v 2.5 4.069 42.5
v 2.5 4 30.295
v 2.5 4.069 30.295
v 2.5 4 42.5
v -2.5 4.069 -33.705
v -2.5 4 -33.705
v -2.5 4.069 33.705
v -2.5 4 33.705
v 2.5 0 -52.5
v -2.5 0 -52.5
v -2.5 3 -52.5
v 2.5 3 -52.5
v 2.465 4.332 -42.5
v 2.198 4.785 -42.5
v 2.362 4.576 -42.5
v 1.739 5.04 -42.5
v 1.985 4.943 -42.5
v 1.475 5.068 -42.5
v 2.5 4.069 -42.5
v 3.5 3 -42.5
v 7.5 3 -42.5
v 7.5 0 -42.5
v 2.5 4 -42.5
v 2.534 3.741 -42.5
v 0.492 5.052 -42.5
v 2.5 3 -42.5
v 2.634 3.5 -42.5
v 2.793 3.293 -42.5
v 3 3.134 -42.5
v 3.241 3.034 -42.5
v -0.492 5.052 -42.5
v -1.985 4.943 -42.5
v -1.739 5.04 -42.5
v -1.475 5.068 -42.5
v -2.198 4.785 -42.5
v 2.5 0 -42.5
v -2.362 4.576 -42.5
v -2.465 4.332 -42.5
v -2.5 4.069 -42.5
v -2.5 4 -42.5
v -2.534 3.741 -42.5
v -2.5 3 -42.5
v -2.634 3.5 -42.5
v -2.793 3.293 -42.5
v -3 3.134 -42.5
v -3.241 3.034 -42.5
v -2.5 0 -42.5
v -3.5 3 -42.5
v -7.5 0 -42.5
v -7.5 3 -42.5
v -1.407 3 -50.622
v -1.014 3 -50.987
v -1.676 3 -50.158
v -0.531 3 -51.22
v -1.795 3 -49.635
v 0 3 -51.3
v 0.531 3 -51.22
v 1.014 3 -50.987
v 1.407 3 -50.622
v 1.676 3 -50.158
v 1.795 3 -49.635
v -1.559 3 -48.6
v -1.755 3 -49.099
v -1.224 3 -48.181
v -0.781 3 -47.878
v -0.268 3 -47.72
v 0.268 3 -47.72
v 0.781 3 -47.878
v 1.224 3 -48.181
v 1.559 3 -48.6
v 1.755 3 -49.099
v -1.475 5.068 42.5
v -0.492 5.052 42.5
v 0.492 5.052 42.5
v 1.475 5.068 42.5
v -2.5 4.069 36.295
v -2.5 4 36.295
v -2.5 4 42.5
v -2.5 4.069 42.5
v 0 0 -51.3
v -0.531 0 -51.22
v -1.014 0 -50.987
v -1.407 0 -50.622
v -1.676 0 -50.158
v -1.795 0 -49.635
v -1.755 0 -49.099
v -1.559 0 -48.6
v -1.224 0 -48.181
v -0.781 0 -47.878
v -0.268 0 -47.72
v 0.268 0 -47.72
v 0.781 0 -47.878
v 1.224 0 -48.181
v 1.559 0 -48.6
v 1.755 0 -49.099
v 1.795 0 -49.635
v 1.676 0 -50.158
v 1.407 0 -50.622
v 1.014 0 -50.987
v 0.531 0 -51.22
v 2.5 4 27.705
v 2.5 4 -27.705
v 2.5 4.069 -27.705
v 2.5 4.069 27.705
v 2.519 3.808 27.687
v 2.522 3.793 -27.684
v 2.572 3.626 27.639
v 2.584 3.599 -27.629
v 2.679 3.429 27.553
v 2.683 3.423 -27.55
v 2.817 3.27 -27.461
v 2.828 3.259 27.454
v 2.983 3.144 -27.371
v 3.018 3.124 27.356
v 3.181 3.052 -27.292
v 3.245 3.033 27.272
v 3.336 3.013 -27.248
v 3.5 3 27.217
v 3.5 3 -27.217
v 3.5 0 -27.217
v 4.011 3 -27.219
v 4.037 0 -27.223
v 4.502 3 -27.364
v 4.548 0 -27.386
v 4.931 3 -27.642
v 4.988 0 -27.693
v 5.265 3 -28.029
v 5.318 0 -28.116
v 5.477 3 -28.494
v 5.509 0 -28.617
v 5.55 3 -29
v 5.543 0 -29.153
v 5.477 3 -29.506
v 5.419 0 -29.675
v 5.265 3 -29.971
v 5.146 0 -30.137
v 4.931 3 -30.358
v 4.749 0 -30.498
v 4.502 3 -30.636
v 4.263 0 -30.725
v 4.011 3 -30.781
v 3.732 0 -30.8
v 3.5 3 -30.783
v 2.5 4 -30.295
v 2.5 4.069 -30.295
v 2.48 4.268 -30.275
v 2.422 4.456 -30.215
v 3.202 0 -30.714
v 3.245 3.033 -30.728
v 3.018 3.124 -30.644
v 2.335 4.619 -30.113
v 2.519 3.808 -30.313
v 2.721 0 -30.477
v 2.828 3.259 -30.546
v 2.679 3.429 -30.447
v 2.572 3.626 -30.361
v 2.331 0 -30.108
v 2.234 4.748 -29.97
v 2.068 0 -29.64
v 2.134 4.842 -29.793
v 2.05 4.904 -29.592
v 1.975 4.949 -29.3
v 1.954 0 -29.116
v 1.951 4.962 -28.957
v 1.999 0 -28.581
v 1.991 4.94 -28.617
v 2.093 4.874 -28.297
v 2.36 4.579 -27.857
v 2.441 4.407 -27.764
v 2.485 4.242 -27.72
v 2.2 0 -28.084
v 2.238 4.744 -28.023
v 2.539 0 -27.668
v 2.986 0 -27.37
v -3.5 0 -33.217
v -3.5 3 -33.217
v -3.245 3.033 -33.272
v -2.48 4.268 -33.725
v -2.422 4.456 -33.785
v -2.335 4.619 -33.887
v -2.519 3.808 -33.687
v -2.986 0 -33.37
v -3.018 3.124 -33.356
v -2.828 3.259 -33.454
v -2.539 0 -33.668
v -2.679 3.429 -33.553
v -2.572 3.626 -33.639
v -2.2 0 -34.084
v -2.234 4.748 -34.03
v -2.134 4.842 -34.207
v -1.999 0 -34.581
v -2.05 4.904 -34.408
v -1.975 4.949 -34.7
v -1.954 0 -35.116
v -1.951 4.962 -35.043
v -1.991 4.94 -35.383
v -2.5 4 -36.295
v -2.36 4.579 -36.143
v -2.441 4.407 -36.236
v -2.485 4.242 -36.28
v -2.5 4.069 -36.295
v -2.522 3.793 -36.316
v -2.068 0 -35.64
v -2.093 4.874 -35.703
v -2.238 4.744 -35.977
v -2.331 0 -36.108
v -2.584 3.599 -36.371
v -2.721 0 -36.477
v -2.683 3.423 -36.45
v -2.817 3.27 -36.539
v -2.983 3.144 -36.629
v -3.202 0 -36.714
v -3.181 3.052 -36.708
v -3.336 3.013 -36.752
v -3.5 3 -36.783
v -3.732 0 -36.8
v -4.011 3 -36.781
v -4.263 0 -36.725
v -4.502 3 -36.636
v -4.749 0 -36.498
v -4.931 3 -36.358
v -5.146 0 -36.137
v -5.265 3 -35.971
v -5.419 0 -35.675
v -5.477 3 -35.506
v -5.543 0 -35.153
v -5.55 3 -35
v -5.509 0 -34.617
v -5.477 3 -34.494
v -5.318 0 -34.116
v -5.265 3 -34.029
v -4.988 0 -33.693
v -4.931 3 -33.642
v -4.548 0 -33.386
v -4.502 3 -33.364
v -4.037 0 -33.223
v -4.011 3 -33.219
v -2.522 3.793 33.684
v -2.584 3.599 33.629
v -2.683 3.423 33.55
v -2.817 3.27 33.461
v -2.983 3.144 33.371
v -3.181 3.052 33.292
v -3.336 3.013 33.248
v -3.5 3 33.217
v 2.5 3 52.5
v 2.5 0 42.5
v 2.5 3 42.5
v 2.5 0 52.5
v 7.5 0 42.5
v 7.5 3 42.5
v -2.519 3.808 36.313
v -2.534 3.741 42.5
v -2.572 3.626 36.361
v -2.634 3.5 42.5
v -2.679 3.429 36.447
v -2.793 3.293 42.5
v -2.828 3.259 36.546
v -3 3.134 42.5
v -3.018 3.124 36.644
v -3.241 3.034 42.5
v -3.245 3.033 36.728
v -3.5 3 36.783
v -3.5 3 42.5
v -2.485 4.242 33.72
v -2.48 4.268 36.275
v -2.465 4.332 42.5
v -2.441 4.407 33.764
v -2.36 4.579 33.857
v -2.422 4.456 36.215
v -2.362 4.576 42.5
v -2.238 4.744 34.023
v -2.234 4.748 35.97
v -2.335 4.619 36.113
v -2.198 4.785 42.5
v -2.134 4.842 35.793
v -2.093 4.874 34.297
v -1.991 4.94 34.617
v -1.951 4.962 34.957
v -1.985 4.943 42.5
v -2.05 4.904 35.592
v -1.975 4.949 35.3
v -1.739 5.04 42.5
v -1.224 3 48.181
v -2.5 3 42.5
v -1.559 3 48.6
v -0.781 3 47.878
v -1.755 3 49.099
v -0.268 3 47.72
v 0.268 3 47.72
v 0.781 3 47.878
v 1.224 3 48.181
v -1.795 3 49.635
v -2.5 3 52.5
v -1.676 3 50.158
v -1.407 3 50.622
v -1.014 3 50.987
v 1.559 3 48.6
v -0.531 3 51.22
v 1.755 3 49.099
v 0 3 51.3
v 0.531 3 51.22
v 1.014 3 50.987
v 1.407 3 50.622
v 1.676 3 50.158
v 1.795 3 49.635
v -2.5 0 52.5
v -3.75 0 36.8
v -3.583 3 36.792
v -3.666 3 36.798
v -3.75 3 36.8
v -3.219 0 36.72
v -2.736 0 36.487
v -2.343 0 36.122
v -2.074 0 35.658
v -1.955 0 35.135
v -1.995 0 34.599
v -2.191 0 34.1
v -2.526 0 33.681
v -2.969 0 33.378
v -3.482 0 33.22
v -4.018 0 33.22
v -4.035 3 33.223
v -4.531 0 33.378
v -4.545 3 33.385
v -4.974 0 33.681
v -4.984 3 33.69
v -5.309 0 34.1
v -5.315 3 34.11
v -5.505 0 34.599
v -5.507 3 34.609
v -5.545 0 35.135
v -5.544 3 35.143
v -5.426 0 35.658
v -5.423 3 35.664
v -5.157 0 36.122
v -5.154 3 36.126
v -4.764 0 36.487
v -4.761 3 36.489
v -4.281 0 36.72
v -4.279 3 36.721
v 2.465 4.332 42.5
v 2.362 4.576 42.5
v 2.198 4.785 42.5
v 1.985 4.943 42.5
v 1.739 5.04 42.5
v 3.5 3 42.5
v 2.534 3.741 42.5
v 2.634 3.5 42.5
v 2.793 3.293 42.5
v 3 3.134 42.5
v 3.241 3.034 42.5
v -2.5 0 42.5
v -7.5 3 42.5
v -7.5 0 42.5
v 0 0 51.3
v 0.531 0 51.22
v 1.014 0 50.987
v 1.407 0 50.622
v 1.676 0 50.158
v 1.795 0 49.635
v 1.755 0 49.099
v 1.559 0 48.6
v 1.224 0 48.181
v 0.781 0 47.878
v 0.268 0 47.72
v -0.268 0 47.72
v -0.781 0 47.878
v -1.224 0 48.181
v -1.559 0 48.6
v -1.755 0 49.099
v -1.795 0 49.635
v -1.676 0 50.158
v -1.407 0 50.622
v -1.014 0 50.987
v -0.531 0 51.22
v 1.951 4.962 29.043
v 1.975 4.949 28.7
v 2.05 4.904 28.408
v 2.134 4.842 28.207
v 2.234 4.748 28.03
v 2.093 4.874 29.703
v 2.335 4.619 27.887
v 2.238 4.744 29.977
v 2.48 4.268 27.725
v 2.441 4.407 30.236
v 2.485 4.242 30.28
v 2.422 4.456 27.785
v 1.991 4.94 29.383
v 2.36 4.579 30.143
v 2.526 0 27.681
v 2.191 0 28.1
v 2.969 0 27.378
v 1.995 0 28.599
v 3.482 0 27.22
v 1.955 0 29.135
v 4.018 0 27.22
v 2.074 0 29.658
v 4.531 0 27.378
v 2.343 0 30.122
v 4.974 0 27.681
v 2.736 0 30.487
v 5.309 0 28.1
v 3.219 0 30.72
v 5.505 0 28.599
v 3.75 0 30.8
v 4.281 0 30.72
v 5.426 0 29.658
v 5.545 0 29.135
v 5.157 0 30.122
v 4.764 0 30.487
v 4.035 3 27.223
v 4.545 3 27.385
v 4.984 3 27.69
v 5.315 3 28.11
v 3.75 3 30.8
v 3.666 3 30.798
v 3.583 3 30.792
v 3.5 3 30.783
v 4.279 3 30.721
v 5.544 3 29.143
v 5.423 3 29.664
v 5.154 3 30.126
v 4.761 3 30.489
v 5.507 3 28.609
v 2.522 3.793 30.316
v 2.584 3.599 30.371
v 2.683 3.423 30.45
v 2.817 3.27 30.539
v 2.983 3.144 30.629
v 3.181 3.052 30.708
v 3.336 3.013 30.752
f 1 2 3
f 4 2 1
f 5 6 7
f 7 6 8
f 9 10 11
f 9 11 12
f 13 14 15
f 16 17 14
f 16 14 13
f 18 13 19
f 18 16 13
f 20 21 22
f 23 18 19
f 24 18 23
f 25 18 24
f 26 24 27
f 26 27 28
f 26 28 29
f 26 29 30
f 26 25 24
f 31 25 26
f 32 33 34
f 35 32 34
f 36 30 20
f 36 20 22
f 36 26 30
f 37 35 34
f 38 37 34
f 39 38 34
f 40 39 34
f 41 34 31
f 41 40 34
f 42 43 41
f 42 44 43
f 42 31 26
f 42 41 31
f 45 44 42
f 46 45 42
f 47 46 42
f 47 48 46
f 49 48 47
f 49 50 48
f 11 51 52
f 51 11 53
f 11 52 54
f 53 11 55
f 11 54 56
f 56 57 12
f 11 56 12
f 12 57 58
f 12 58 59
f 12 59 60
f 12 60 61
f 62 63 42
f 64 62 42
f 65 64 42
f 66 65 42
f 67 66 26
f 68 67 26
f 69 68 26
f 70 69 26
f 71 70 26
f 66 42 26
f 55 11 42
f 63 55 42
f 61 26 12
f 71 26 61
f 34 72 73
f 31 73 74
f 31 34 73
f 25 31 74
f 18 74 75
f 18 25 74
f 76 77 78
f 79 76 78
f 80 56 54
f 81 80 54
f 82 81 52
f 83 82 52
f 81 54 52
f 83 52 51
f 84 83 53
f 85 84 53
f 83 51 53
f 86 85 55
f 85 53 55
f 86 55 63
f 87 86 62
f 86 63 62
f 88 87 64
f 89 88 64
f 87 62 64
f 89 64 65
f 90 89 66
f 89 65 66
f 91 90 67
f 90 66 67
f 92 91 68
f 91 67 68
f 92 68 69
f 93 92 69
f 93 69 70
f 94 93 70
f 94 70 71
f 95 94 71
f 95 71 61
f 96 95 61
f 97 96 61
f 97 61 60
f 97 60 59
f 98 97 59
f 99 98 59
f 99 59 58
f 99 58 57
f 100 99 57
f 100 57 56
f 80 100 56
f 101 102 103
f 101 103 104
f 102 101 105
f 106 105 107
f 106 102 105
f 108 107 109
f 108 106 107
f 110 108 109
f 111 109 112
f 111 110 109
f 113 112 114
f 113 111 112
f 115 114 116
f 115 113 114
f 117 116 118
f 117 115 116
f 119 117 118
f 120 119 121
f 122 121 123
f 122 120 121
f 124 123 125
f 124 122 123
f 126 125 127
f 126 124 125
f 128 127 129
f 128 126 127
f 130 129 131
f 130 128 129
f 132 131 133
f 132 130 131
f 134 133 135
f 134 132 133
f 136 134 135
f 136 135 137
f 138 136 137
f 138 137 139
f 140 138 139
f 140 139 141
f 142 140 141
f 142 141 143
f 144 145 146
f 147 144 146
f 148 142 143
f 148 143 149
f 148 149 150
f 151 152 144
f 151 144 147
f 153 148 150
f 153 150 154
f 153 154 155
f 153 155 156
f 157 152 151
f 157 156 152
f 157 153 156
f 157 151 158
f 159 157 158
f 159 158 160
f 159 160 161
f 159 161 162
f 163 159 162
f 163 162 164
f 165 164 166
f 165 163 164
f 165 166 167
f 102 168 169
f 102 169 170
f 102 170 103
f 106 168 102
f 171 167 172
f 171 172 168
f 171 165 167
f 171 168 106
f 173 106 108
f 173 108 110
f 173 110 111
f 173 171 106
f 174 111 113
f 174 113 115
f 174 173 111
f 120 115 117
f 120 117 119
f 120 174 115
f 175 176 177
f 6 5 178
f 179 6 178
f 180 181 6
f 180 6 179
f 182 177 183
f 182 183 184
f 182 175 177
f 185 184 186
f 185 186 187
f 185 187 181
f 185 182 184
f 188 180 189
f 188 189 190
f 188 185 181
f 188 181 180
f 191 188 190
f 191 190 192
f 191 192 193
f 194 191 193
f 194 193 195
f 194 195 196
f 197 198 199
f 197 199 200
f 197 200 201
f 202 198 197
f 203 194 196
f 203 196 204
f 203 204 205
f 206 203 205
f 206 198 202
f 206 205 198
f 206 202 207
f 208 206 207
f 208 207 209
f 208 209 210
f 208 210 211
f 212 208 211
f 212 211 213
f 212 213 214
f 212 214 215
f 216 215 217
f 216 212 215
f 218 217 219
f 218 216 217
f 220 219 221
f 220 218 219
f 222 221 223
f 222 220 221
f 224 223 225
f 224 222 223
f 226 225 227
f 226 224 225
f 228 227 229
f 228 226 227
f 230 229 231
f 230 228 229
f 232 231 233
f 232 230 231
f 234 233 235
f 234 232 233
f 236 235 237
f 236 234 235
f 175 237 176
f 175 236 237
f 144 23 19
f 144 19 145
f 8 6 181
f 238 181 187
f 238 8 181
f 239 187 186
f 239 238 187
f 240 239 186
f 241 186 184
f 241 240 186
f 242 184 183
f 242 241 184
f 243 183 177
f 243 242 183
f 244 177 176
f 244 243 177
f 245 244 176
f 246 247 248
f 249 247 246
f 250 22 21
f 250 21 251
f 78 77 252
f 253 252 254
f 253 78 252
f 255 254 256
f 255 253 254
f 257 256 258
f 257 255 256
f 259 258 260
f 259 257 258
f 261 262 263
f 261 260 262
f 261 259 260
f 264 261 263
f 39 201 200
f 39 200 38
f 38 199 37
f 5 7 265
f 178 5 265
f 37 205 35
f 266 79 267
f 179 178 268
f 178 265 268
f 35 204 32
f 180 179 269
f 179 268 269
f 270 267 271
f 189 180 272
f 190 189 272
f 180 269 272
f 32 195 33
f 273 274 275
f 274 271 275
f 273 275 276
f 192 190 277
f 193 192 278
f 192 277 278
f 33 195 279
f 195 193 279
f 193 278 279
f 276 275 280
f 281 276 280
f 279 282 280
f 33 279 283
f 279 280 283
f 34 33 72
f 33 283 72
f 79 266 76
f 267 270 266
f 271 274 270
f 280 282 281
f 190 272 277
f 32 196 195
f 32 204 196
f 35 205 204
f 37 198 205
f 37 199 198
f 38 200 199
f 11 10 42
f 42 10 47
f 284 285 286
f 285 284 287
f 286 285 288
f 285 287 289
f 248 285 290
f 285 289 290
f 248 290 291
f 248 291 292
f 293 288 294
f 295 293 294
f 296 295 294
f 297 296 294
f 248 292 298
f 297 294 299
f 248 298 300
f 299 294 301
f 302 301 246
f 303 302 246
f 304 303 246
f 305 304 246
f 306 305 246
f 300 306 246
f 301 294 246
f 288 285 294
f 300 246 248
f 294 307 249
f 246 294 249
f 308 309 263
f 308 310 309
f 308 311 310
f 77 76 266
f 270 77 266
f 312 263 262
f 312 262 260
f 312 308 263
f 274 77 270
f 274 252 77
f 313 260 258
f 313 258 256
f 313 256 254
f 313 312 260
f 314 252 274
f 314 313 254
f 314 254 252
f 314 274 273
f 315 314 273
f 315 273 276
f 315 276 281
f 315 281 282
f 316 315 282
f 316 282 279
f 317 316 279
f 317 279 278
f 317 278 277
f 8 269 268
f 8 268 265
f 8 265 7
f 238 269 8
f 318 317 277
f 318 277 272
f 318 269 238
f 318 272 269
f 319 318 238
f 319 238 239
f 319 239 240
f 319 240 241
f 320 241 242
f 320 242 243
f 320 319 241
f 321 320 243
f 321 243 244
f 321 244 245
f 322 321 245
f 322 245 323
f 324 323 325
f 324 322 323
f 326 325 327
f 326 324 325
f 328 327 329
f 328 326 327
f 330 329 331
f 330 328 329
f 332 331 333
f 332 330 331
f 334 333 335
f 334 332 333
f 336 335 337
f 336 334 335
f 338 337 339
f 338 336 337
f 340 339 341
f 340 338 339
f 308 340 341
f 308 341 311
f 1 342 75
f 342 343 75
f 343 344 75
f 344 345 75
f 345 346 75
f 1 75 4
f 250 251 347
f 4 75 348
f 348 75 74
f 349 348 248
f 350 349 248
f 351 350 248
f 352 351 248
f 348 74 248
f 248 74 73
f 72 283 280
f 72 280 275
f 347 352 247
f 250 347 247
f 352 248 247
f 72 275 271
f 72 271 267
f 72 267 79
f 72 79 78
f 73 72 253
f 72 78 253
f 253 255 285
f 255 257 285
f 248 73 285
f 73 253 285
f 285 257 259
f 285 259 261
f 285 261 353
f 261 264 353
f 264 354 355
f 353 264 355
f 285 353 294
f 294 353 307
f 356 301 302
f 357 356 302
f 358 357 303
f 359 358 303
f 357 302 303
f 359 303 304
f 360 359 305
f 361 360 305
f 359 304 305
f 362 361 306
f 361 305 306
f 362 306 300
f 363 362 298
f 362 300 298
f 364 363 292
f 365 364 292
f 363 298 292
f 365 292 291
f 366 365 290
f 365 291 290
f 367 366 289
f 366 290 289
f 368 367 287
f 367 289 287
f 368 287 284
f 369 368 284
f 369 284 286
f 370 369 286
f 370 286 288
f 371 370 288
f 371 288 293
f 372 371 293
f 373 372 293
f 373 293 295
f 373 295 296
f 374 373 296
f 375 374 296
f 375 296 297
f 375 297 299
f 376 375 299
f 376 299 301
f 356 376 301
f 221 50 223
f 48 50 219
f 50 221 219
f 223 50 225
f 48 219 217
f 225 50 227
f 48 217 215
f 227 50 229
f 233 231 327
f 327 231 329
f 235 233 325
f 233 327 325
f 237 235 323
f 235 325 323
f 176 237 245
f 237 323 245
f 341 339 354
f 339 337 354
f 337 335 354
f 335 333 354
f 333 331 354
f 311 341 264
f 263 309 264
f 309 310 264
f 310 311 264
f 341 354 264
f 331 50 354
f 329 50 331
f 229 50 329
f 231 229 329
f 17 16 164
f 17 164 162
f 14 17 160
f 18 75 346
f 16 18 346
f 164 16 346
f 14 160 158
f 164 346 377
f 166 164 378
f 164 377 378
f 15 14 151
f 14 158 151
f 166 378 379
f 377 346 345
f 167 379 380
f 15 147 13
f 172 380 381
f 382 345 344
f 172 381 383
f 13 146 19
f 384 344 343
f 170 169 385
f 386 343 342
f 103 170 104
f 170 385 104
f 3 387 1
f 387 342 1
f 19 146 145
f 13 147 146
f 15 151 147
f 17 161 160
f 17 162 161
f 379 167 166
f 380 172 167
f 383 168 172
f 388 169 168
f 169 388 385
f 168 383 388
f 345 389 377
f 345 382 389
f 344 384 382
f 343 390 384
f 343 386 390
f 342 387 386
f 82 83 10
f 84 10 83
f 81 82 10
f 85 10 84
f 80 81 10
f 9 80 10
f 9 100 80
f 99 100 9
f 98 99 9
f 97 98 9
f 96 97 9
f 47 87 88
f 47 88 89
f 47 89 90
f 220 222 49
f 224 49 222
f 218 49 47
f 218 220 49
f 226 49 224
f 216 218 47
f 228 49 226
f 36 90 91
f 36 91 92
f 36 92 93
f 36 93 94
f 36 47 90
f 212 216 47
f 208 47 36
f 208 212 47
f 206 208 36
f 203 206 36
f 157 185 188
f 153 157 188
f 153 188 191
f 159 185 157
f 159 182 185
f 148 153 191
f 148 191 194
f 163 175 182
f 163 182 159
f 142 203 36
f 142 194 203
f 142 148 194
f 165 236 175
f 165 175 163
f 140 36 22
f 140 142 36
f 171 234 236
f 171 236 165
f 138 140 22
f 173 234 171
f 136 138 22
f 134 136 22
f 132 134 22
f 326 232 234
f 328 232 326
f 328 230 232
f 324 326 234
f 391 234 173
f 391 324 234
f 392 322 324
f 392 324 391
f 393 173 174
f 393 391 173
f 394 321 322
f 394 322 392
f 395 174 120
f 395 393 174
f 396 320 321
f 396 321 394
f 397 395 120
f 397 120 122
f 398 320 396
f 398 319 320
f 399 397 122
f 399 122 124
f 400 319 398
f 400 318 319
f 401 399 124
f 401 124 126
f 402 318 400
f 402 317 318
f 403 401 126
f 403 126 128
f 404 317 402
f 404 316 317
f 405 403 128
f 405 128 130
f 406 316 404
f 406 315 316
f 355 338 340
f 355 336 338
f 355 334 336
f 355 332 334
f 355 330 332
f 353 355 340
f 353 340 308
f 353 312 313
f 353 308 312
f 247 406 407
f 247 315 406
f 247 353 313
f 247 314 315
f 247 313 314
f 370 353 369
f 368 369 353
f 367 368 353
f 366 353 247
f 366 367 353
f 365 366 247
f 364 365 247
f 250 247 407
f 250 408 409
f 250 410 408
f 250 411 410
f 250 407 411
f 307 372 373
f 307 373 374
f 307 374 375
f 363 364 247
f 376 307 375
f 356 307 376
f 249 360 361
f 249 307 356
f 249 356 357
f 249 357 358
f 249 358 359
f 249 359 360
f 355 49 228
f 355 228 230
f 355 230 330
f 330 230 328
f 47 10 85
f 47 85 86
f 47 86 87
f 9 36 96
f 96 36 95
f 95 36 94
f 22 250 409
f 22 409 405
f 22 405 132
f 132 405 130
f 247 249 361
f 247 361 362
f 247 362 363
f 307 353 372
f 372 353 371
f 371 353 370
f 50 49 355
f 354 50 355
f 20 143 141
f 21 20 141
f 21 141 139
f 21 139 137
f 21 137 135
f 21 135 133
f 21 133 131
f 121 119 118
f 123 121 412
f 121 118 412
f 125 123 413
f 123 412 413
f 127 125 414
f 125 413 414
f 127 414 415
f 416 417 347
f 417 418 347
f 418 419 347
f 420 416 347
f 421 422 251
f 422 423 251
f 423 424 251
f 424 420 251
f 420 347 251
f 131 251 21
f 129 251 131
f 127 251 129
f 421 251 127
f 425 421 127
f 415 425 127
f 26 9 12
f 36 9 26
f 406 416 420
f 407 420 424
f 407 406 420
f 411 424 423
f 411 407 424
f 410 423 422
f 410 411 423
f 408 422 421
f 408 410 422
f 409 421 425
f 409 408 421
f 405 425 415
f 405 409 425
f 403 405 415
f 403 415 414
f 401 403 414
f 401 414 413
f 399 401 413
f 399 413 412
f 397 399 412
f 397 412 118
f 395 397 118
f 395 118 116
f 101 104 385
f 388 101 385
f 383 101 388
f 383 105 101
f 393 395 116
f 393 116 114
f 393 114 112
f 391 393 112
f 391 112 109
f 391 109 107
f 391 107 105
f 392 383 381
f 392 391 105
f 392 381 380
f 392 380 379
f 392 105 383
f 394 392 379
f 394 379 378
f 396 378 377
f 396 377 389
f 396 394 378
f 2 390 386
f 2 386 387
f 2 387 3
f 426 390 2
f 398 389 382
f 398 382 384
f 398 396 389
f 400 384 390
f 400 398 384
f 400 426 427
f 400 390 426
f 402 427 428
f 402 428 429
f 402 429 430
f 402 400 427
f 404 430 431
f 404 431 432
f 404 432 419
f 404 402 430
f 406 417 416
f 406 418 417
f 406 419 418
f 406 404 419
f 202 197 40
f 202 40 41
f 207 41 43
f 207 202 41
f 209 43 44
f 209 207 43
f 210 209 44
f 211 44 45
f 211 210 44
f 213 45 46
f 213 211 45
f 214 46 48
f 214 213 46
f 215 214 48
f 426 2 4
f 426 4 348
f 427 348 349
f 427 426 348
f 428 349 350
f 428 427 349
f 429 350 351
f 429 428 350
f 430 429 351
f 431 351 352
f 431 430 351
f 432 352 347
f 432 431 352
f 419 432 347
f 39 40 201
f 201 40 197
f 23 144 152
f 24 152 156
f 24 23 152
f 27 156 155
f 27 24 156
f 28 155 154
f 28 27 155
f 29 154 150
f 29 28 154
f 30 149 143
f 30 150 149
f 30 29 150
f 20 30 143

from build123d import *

# Parameters (mm, degrees)
SKETCH1_W               = 5
SKETCH1_H               = 85
BOSS_EXTRUDE1_DEPTH     = 3
BOSS_EXTRUDE2_DEPTH     = 42.5
BOSS_EXTRUDE3_START     = 42.5
BOSS_EXTRUDE3_DEPTH     = 42.5
SKETCH8_W               = 5
SKETCH8_H               = 10
BOSS_EXTRUDE4_DEPTH     = 3
SKETCH6_R               = 1.8
CUT_EXTRUDE1_DEPTH      = 53.645037753
SKETCH9_W               = 15
SKETCH9_H               = 85
BOSS_EXTRUDE5_DEPTH     = 3
FILLET1_R               = 1
CUT_EXTRUDE2_DEPTH      = 54.117793629
CUT_EXTRUDE2_DEPTH_BACK = 54.117793629
SKETCH10_R              = 1.8


with BuildPart() as part:
    # Sketch1 → Boss-Extrude1 (new body)
    with BuildSketch(Plane(origin=(0, 0, 0), x_dir=(1, 0, 0), z_dir=(0, 1, 0))):
        Rectangle(SKETCH1_W, SKETCH1_H)
    extrude(amount=BOSS_EXTRUDE1_DEPTH)

    # Sketch3 → Boss-Extrude2 (add)
    with BuildSketch(Plane.XY):
        with BuildLine():
            Line((-2.5, 3), (-2.5, 5.102989898))
            ThreePointArc((-2.5, 5.102989898), (0, 5.05), (2.5, 5.102989898))
            Line((2.5, 5.102989898), (2.5, 3))
            Line((2.5, 3), (2.5, 0))
            Line((2.5, 0), (-2.5, 0))
            Line((-2.5, 0), (-2.5, 3))
        make_face()
    extrude(amount=BOSS_EXTRUDE2_DEPTH)

    # Sketch7 → Boss-Extrude3 (add)
    with BuildSketch(Plane(origin=(0, 0, 0), x_dir=(-1, 0, 0), z_dir=(0, 0, -1)).offset(BOSS_EXTRUDE3_START)):
        with BuildLine():
            Line((-2.5, 5.102989898), (-2.5, 3))
            Line((-2.5, 3), (2.5, 3))
            Line((2.5, 3), (2.5, 5.102989898))
            ThreePointArc((2.5, 5.102989898), (0, 5.05), (-2.5, 5.102989898))
        make_face()
    extrude(amount=-BOSS_EXTRUDE3_DEPTH)

    # Sketch8 → Boss-Extrude4 (add)
    with BuildSketch(Plane.XZ):
        with Locations((0, 47.5)):
            Rectangle(SKETCH8_W, SKETCH8_H)
        with Locations((0, -47.5)):
            Rectangle(SKETCH8_W, SKETCH8_H)
    extrude(amount=-BOSS_EXTRUDE4_DEPTH)

    # Sketch6 → Cut-Extrude1 (cut, through all)
    with BuildSketch(Plane(origin=(0, 3, 0), x_dir=(1, 0, 0), z_dir=(0, 1, 0))):
        with Locations(Location((0, -49.5, 0), (0, 0, 270))):
            Circle(SKETCH6_R)
        with Locations(Location((0, 49.5, 0), (0, 0, 90))):
            Circle(SKETCH6_R)
    extrude(amount=-CUT_EXTRUDE1_DEPTH, mode=Mode.SUBTRACT)

    # Sketch9 → Boss-Extrude5 (add)
    with BuildSketch(Plane.XZ):
        Rectangle(SKETCH9_W, SKETCH9_H)
    extrude(amount=-BOSS_EXTRUDE5_DEPTH)

    # Fillet1
    # the kernel refuses this fillet: 1 mm, written as the material it adds along each edge
    with BuildSketch(Plane(origin=(2.5, 3, -42.5), x_dir=(0, 1, 0), z_dir=(0, 0, 1)), Plane(origin=(-2.5, 3, 42.5), x_dir=(0, 1, 0), z_dir=(0, 0, -1))) as fillet1_piece_1:
        with BuildLine():
            CenterArc((FILLET1_R, -FILLET1_R), FILLET1_R, 90, 90)
            Line((0, -FILLET1_R), (0, 0))
            Line((0, 0), (FILLET1_R, 0))
        make_face()
    extrude(amount=85)
    # the kernel refuses this fillet: 1 mm, written as the material it takes off along each edge
    with BuildSketch(Plane(origin=(-2.5, 5.102989898, 45.085592418), x_dir=(0, -1, 0), z_dir=(0, 0, -1))) as fillet1_2_piece_1:
        with BuildLine():
            CenterArc((1.034236967, -1), FILLET1_R, 90, 91.432543738)
            ThreePointArc((0.034549516, -1.025), (0.019501965, -0.512424928), (0, 0))
            Line((0, 0), (1.034236967, 0))
        make_face()
    extrude(amount=90.171184836, mode=Mode.SUBTRACT)
    with BuildSketch(Plane(origin=(2.5, 5.102989898, 45.085592418), x_dir=(0, -1, 0), z_dir=(0, 0, -1))) as fillet1_2_piece_2:
        with BuildLine():
            CenterArc((1.034236967, 1), FILLET1_R, 178.567456262, 91.432543738)
            ThreePointArc((0.034549516, 1.025), (0.019501965, 0.512424928), (0, 0))
            Line((0, 0), (1.034236967, 0))
        make_face()
    extrude(amount=90.171184836, mode=Mode.SUBTRACT)

    # Sketch10 → Cut-Extrude2 (cut, two sides: drawn at the far end of the back side and taken through both)
    with BuildSketch(Plane(origin=(0, 3, 0), x_dir=(1, 0, 0), z_dir=(0, 1, 0)).offset(-CUT_EXTRUDE2_DEPTH_BACK)):
        with Locations(Location((-3.75, -35, 0), (0, 0, 270))):
            Circle(SKETCH10_R)
        with Locations(Location((3.75, -29, 0), (0, 0, 270))):
            Circle(SKETCH10_R)
        with Locations(Location((3.75, 29, 0), (0, 0, 262.016443854))):
            Circle(SKETCH10_R)
        with Locations(Location((-3.75, 35, 0), (0, 0, 277.983556156))):
            Circle(SKETCH10_R)
    extrude(amount=CUT_EXTRUDE2_DEPTH + CUT_EXTRUDE2_DEPTH_BACK, mode=Mode.SUBTRACT)


solid = part.part
